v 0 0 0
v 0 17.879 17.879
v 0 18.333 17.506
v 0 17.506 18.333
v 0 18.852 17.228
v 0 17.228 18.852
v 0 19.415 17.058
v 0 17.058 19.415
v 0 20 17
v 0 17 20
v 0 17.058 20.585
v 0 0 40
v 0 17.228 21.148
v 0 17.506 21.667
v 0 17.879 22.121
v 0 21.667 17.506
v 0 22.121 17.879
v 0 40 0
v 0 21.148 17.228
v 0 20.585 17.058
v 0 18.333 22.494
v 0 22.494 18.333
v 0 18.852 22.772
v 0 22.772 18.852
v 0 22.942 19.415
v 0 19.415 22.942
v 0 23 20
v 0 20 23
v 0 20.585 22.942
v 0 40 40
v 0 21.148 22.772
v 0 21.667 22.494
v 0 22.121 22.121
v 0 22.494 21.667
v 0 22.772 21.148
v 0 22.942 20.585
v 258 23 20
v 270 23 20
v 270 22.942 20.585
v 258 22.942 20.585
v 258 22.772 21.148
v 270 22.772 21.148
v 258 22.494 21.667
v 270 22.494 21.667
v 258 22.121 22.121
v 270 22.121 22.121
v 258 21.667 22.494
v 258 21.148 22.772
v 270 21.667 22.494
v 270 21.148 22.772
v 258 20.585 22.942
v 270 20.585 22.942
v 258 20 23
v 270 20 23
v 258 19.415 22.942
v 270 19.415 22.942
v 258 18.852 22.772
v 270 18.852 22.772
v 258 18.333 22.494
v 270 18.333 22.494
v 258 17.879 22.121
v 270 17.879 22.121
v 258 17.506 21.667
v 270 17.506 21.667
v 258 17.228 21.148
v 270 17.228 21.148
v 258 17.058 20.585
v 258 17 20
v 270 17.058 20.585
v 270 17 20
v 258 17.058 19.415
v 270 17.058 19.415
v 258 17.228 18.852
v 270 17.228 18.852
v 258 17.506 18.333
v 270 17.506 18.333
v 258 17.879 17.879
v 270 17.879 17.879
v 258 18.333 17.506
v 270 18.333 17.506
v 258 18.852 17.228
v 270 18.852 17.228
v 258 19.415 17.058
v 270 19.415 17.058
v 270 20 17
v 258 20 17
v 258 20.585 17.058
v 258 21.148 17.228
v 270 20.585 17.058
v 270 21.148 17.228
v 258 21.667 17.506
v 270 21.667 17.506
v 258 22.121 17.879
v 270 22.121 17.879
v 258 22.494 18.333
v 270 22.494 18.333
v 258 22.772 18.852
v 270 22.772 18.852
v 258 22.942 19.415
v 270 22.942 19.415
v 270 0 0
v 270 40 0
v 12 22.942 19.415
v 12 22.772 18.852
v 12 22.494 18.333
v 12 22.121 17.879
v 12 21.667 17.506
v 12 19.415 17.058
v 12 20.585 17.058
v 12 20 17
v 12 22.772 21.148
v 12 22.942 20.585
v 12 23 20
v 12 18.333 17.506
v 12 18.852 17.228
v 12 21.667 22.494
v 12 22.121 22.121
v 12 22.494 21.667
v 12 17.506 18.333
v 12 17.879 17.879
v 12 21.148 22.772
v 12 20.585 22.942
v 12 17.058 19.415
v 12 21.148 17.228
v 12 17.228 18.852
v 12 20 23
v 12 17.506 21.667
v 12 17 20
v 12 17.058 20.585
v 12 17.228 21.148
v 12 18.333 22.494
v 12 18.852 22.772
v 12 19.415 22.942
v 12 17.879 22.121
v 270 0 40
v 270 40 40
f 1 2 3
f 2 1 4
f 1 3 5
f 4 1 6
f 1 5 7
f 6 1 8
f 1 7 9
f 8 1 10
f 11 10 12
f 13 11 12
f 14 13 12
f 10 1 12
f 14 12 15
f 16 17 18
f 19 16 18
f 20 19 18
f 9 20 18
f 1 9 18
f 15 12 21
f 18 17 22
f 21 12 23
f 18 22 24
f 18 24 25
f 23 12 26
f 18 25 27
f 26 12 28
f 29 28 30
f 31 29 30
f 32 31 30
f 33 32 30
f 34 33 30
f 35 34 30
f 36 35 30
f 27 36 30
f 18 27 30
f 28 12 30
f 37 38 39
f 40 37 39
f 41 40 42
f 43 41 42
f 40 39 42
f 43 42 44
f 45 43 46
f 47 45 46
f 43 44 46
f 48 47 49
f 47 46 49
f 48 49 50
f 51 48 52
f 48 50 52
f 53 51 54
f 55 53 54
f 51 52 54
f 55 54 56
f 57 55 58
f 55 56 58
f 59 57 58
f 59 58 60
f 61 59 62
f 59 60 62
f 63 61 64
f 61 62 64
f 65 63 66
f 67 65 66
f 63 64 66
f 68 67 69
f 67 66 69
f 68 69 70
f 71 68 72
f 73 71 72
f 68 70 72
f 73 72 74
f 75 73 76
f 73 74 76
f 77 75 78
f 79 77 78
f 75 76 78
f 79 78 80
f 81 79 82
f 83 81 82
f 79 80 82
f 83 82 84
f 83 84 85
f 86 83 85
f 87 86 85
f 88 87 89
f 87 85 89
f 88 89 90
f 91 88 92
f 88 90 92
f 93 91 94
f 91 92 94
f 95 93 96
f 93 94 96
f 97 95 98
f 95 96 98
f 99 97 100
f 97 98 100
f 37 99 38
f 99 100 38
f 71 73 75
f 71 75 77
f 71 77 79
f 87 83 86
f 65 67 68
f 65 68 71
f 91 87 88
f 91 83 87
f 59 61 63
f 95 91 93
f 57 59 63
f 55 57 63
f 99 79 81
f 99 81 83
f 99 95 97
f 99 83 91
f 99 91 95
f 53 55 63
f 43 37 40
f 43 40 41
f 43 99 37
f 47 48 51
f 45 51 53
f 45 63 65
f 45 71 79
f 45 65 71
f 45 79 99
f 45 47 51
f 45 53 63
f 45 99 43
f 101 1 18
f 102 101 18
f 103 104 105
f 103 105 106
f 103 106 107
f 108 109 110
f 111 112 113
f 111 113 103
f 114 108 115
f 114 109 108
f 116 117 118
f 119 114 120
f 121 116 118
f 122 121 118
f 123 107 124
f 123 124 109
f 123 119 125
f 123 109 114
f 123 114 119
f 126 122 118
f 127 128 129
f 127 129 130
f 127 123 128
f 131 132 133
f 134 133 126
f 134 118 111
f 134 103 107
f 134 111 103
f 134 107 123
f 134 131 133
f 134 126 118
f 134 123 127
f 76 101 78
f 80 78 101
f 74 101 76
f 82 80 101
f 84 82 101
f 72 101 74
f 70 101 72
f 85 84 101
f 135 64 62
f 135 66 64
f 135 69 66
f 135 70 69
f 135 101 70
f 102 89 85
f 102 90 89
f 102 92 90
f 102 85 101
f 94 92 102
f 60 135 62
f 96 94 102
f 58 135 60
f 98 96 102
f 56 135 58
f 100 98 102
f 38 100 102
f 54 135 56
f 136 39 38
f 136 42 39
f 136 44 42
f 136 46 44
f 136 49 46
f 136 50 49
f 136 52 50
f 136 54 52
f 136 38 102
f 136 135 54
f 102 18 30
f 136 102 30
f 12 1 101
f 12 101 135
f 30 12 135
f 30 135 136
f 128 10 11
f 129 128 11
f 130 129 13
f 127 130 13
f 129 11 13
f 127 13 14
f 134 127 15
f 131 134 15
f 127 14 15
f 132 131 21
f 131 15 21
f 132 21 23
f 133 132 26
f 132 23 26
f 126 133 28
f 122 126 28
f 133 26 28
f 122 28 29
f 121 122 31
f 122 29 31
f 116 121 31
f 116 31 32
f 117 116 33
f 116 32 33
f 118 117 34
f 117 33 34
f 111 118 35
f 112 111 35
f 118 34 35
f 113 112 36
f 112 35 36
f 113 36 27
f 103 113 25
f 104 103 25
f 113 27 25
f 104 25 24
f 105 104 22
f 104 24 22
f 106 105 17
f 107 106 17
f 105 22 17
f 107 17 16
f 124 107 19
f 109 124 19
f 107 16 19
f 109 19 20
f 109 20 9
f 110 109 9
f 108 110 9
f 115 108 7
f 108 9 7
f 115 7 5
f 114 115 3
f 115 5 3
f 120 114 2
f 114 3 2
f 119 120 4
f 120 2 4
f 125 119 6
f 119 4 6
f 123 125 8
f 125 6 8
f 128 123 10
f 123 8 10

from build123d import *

# Parameters (mm, degrees)
F0_W     = 40
F0_H     = 40
F1_DEPTH = 270
F2_R     = 3
F3_DEPTH = 12
F4_R     = 3
F5_DEPTH = 12


with BuildPart() as f1:
    # F0 (on Right) → F1 (new body)
    with BuildSketch(Plane.YZ):
        with Locations((20, 20)):
            Rectangle(F0_W, F0_H)
    extrude(amount=F1_DEPTH)

    # F2 (on face) → F3 (cut)
    with BuildSketch(Plane.YZ.offset(270)):
        with Locations((20, 20)):
            Circle(F2_R)
    extrude(amount=-F3_DEPTH, mode=Mode.SUBTRACT)

    # F4 (on face) → F5 (cut)
    with BuildSketch(Plane(origin=(0, 0, 0), x_dir=(0, -1, 0), z_dir=(-1, 0, 0))):
        with Locations((-20, 20)):
            Circle(F4_R)
    extrude(amount=-F5_DEPTH, mode=Mode.SUBTRACT)


solid = f1.part
